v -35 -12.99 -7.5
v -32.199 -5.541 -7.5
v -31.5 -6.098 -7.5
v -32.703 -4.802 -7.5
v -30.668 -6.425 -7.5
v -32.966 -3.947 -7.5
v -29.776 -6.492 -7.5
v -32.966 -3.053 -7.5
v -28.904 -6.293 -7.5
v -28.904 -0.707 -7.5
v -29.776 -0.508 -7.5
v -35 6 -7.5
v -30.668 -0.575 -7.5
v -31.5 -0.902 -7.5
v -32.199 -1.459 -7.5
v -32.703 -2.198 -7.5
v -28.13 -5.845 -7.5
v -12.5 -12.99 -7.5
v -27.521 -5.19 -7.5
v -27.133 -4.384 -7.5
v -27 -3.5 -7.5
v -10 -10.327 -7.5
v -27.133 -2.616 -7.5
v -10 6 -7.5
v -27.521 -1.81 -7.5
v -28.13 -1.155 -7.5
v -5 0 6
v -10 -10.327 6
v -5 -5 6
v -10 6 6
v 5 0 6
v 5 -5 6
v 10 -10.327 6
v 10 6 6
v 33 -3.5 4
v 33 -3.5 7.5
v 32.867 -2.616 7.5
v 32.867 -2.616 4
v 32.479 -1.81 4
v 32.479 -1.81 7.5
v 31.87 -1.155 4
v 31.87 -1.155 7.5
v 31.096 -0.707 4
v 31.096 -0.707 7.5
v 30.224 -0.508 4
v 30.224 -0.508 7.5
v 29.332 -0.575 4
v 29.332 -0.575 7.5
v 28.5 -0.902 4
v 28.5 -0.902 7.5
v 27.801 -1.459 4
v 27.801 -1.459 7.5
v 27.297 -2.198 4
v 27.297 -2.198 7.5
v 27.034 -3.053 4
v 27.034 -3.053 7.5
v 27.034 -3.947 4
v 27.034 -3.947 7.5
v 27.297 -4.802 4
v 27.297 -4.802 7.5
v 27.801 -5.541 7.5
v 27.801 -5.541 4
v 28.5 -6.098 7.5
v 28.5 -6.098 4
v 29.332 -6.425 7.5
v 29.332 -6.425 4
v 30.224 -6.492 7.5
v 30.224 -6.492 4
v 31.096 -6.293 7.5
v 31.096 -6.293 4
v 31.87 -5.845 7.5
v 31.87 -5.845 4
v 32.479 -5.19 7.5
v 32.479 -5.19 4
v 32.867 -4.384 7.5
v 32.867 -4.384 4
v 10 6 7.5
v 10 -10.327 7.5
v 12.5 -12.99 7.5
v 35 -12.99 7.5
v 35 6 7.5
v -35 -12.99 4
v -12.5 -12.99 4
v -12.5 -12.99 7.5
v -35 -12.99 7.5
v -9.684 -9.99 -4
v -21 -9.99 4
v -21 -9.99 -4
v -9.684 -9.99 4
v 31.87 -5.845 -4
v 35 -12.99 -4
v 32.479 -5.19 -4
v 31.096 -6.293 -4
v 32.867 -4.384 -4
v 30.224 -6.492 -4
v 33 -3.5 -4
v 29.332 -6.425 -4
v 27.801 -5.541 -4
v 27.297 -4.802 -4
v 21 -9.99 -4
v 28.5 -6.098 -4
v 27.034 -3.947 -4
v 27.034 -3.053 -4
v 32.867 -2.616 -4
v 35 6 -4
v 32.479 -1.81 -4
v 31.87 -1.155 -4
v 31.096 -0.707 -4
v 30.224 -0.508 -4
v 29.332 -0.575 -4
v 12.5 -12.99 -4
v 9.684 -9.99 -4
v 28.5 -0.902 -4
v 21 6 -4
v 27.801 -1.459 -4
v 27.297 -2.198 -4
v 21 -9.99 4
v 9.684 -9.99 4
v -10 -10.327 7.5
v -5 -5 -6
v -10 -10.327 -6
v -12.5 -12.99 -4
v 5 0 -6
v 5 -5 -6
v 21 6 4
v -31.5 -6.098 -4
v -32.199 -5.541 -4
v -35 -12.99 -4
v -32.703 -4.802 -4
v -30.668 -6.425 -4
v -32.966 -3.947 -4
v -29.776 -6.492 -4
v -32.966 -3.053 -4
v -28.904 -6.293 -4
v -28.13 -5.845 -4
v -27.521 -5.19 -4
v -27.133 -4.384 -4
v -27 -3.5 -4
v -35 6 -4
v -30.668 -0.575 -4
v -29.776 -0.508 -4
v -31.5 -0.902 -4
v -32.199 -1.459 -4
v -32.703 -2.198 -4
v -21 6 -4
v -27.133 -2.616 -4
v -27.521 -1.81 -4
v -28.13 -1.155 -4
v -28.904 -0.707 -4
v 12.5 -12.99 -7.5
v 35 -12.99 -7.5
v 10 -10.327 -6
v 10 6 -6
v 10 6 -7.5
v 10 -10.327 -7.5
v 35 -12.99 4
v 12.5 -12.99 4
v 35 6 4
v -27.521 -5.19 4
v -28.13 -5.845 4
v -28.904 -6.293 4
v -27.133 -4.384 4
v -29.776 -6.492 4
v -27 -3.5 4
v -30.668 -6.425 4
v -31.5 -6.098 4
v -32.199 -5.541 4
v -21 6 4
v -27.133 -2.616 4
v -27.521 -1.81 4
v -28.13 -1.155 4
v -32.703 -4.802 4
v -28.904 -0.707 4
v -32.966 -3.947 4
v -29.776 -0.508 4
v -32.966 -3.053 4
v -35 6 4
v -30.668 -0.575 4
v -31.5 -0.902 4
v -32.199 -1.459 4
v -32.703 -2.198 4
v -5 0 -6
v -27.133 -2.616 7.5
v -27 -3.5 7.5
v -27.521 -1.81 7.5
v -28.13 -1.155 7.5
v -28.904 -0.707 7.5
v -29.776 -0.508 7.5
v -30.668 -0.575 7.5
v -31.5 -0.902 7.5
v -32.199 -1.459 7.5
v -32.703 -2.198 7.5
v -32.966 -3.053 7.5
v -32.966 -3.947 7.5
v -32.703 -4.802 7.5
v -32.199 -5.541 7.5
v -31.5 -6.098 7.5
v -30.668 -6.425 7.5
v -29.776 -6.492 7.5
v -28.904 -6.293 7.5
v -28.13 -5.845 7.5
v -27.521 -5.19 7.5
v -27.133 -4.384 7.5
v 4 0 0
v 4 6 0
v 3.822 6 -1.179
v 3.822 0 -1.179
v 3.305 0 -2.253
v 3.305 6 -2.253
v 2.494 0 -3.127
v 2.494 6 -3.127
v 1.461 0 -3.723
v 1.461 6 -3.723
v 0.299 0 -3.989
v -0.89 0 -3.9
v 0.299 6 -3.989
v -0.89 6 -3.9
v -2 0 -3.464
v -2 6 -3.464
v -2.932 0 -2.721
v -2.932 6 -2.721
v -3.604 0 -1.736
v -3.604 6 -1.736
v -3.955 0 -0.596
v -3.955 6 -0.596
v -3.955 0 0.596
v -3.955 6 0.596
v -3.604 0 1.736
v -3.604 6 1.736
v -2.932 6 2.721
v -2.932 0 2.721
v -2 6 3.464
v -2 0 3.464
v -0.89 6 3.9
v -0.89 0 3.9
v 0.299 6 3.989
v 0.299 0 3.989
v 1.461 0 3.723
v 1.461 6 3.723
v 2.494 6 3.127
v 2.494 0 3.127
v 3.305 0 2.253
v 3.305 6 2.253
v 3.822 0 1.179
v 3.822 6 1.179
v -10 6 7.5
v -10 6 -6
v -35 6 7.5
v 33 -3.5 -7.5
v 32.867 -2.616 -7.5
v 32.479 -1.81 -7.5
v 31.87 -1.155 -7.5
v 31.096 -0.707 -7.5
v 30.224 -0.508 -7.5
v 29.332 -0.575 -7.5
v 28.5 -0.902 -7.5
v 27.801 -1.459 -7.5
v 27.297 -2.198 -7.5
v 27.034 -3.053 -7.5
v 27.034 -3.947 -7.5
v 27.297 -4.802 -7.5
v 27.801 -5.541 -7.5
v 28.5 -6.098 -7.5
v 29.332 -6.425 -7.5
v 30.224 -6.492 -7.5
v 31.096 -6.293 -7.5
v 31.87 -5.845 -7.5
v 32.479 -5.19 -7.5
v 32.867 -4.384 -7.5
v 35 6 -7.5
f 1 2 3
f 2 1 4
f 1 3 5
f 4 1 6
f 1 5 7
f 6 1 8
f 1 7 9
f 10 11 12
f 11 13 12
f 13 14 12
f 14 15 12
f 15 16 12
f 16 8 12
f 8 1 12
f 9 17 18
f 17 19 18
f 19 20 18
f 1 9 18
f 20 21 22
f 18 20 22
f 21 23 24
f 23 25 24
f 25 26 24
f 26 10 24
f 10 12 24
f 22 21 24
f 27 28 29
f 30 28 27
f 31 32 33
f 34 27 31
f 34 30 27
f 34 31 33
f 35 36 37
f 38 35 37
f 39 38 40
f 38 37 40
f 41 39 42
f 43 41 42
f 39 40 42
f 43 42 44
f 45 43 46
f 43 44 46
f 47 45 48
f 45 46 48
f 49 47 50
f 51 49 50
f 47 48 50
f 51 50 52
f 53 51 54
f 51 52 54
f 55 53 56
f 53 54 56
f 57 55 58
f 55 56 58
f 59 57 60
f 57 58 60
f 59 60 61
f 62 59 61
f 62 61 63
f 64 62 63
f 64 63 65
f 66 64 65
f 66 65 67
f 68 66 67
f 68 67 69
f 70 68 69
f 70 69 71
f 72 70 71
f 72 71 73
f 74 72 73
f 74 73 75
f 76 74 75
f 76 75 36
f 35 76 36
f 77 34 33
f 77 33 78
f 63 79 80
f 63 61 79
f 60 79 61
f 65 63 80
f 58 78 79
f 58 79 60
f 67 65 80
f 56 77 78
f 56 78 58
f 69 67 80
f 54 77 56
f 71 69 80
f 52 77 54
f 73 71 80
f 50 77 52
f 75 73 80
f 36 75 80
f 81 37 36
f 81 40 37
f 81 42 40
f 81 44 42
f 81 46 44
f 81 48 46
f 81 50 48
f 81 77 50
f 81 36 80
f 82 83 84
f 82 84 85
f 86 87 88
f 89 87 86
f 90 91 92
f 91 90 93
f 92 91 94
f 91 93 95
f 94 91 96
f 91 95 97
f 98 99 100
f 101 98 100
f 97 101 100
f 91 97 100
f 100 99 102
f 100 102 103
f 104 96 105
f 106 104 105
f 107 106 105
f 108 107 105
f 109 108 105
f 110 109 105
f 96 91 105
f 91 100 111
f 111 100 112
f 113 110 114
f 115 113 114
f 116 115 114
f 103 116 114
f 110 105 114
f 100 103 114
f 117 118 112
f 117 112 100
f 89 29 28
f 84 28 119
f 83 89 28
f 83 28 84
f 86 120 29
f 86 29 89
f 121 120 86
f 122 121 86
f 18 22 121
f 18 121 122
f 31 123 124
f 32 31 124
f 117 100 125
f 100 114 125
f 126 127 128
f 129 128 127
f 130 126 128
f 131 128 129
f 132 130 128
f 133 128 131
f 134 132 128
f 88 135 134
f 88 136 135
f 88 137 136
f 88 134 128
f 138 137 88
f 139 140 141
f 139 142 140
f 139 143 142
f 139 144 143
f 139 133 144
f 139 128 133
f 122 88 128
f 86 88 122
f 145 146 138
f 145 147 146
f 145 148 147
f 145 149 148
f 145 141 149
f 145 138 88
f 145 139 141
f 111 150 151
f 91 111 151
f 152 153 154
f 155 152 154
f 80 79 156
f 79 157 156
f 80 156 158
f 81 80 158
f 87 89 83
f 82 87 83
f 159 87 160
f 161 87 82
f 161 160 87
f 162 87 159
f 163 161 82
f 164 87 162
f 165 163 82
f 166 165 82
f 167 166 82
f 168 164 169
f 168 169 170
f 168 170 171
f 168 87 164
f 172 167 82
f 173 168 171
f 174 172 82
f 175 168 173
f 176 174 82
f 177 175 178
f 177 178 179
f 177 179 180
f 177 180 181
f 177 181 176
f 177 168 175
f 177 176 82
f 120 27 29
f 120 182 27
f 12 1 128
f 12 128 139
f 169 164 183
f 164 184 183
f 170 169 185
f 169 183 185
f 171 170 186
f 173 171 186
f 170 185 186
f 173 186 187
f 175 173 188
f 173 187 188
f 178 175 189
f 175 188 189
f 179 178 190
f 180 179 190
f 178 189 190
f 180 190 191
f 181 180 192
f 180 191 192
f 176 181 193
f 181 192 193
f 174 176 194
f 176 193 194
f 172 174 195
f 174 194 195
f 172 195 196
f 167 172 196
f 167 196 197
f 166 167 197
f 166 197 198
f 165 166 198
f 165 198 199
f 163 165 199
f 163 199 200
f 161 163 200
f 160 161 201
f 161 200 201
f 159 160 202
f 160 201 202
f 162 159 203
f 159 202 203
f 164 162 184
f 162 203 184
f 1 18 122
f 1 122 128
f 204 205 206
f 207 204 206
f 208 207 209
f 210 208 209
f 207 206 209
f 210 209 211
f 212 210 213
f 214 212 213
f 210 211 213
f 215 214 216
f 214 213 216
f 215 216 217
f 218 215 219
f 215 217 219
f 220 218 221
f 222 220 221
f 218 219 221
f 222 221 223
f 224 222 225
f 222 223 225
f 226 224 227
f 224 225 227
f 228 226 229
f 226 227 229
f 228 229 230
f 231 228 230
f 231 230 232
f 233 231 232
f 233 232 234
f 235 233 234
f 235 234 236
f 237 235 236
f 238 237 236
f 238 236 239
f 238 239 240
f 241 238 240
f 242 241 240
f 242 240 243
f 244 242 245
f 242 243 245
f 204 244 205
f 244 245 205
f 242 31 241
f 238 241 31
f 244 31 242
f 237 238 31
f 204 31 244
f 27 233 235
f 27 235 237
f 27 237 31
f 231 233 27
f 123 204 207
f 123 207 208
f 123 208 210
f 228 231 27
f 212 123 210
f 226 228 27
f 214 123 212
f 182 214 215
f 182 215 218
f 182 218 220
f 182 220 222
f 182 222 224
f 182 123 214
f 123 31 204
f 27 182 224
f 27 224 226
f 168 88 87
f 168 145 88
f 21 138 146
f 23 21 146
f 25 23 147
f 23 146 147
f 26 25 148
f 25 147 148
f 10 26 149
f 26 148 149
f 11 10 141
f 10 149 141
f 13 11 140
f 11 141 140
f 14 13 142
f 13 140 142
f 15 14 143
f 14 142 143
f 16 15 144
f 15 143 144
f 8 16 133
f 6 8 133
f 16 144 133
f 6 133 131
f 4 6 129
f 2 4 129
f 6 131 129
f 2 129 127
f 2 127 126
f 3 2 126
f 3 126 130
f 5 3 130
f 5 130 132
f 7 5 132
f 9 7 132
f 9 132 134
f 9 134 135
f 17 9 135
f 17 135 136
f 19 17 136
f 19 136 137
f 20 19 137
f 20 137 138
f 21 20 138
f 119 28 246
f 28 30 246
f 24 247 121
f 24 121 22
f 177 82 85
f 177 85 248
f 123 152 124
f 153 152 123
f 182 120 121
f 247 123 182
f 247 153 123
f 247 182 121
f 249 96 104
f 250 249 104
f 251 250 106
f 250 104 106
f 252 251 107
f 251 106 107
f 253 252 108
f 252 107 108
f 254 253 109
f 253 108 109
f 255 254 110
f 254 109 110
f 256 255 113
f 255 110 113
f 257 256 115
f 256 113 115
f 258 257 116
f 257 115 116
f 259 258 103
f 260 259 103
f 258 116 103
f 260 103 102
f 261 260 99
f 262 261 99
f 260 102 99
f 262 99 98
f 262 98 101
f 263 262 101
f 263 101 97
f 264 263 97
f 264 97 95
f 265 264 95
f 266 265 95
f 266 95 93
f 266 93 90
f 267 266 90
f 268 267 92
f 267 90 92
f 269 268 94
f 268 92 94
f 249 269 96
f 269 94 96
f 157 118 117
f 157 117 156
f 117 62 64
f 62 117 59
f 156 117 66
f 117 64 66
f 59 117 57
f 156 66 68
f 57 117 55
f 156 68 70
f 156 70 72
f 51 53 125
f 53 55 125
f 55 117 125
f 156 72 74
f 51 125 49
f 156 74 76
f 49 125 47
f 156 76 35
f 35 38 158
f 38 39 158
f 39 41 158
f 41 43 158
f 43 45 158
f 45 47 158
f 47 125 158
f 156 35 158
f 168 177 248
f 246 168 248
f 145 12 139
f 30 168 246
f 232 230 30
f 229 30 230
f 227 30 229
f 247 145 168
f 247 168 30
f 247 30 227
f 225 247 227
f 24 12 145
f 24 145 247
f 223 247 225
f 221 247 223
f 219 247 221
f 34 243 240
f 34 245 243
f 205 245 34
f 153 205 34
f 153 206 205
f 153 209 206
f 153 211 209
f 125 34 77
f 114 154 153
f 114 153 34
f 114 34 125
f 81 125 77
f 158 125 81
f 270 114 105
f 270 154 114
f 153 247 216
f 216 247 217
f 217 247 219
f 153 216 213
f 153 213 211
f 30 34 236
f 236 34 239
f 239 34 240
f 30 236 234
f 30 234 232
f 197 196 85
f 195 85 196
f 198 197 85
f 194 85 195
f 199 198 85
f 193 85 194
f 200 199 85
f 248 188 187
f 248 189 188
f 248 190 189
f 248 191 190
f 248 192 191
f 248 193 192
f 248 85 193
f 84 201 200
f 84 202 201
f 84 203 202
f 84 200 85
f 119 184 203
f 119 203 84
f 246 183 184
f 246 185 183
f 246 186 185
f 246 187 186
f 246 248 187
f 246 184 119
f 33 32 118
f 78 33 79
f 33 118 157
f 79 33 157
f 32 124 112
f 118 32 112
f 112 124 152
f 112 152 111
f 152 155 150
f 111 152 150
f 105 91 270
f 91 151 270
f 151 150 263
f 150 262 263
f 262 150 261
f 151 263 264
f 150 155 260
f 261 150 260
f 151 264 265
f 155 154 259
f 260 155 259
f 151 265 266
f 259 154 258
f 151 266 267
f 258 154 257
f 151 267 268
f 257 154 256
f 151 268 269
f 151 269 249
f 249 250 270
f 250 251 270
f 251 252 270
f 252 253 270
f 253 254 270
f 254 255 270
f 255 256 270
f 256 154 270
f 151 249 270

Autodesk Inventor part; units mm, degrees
ref_plane "YZ Plane" through (0, 0, 0) normal (1, 0, 0) x (0, 1, 0)
ref_plane "XZ Plane" through (0, 0, 0) normal (0, 1, 0) x (-1, 0, 0)
ref_plane "XY Plane" through (0, 0, 0) normal (0, 0, 1) x (1, 0, 0)
sketch "Sketch1" plane through (0, 0, 0) normal (0, 0, 1) x (1, 0, 0)
  line L0 (0, 0) -> (-5, 0)
  line L1 (0, 0) -> (5, 0)
  line L2 (-5, 0) -> (-5, -4) construction
  line L3 (-5, -4) -> (-23.8125, -4) construction
  line L4 (-5, 0) -> (10, 0) construction
  line L5 (0, -6.9282) -> (-35, -6.9282) construction
  line L6 (-12.5, -12.9904) -> (-35, -12.9904)
  line L7 (-23.8125, -4) -> (-23.8125, -8) construction
  line L8 (-35, -12.9904) -> (-35, -8)
  line L9 (-35, 0) -> (-35, 6)
  line L10 (-35, 6) -> (0, 6)
  line L11 (0, 6) -> (0, 0) construction
  line L12 (0, 0) -> (5, 0)
  line L13 (12.5, -12.9904) -> (35, -12.9904)
  line L14 (35, -12.9904) -> (35, -8)
  line L15 (35, 0) -> (35, 6)
  line L16 (35, 6) -> (0, 6)
  line L17 (-5, 0) -> (-5, -5)
  line L18 (-5, -5) -> (-12.5, -12.9904)
  line L19 (5, 0) -> (5, -5)
  line L20 (5, -5) -> (12.5, -12.9904)
  line L21 (-25, 0) -> (-21, 0)
  line L22 (-35, 0) -> (-35, -8)
  line L23 (35, 0) -> (35, -8)
  dimension "d0" = 5
  dimension "d1" = 5
  dimension "d2" = 4
  dimension "d3" = 15
  dimension "d5" = 35
  dimension "d10" = 6
  dimension "d24" = 5
  dimension "d25" = 5
  dimension "d27" = 4
extrude "Extrusion1" add sketch "Sketch1" along normal mid plane 15
sketch "Sketch5" plane through (-35, 6, 7.5) normal (0, 1, 0) x (1, 0, 0)
  circle A0 centre (35, 7.5) radius 2 construction
  line L0 (35, 7.5) -> (35, 13.5) construction
  line L1 (35, 7.5) -> (25, 7.5) construction
  line L2 (35, 13.5) -> (25, 13.5)
  line L3 (25, 13.5) -> (25, 1.5)
  line L4 (25, 1.5) -> (45, 1.5)
  line L5 (45, 1.5) -> (45, 13.5)
  line L6 (45, 13.5) -> (35, 13.5)
  line L7 (25, 13.5) -> (25, 15)
  line L8 (0, 15) -> (70, 15) projected
  line L9 (45, 13.5) -> (45, 15)
  line L10 (45, 15) -> (25, 15)
  line L11 (25, 1.5) -> (25, 0)
  line L12 (25, 0) -> (45, 0)
  line L13 (40, 0) -> (47.5, 0) projected
  line L14 (45, 1.5) -> (45, 0)
  dimension "d40" = 6
  dimension "d41" = 10
  dimension "d42" = 12
  dimension "d43" = 20
  dimension "d44" = 12
extrude "Extrusion5" cut sketch "Sketch5" against normal blind 18 contours L2 L7 L8 L9 L6 | L4 L14 L12 L11
sketch "Sketch6" plane through (35, 6, 7.5) normal (0, 1, 0) x (1, 0, 0)
  circle A0 centre (-35, 7.5) radius 4
  dimension "d47" = 8
extrude "Extrusion6" cut sketch "Sketch6" against normal blind 6
sketch "Sketch7" plane through (35, 6, 7.5) normal (0, 1, 0) x (1, 0, 0)
  line L0 (-35, 7.5) -> (-65, 7.5) construction
  line L1 (-65, 7.5) -> (-65, 11.5) construction
  line L2 (-65, 11.5) -> (-65, 3.5) construction
  line L3 (-65, 3.5) -> (-70, 3.5)
  line L4 (-70, 15) -> (-70, 0) projected
  line L5 (-70, 3.5) -> (-70, 11.5)
  line L6 (-70, 11.5) -> (-65, 11.5)
  line L7 (-70, 11.5) -> (-65, 11.5)
  line L8 (-70, 11.5) -> (-56, 11.5)
  line L9 (-56, 11.5) -> (-56, 3.5)
  line L10 (-56, 3.5) -> (-70, 3.5)
  circle A0 centre (-35, 7.5) radius 4 construction
  line L11 (-35, 7.5) -> (-35, 1.5875) construction
  line L12 (0, 15) -> (0, 0)
  line L13 (0, 11.5) -> (-14, 11.5)
  line L14 (-14, 11.5) -> (-14, 3.5)
  line L15 (-14, 3.5) -> (0, 3.5)
  dimension "d50" = 30
  dimension "d51" = 4
  dimension "d52" = 8
  dimension "d53" = 14
extrude "Extrusion7" cut sketch "Sketch7" against normal blind 19
sketch "Sketch8" plane through (0, 0, 7.5) normal (0, 0, 1) x (1, 0, 0)
  line L0 (0, 0) -> (-30, 0) construction
  line L1 (-21, 6) -> (-35, 6) construction
  line L2 (-30, 6) -> (-30, -3.5) construction
  line L3 (-30, 6) -> (-20.5, 6) construction
  circle A0 centre (-30, -3.5) radius 3
  line L4 (0, 0) -> (0, -2.1213) construction
  circle A1 centre (30, -3.5) radius 3
  dimension "d56" = 30
  dimension "d57" = 9.5
  dimension "d58" = 90
  dimension "d59" = 6
extrude "Extrusion8" cut sketch "Sketch8" against normal blind 15
sketch "Sketch9" plane through (-35, -12.9904, -7.5) normal (0, -1, 0) x (1, 0, 0)
  line L0 (14, 3.5) -> (14, 11.5) construction
  line L1 (14, 11.5) -> (14, 11.5) construction
  line L2 (14, 11.5) -> (25.4, 11.5)
  line L3 (25.4, 11.5) -> (25.4, 3.5)
  line L4 (25.4, 3.5) -> (14, 3.5)
  line L5 (35, 7.5) -> (35, 13.3991) construction
  line L6 (14, 11.5) -> (14, 3.5)
  line L7 (56, 3.5) -> (56, 11.5) construction
  line L8 (56, 11.5) -> (44.6, 11.5)
  line L9 (44.6, 11.5) -> (44.6, 3.5)
  line L10 (44.6, 3.5) -> (56, 3.5)
  line L11 (56, 3.5) -> (56, 11.5)
  dimension "d62" = 0
  dimension "d63" = 90
  dimension "d64" = 8
extrude "Extrusion9" cut sketch "Sketch9" against normal blind 3
equation "\"BendRadius\" = Thickness"
equation "\"BendReliefWidth\" = Thickness"
equation "\"BendReliefDepth\" = 0.5 * Thickness"
equation "\"CornerReliefSize\" = 4 * Thickness"
equation "\"MinimumRemnant\" = 2 * Thickness"
equation "\"TransitionRadius\" = BendRadius"
equation "\"JacobiRadiusSize\" = BendRadius"
equation "\"GapSize\" = Thickness"
equation "\"Thickness\" = 3.048"
properties part number "Belka" material "Aluminum 6061"
